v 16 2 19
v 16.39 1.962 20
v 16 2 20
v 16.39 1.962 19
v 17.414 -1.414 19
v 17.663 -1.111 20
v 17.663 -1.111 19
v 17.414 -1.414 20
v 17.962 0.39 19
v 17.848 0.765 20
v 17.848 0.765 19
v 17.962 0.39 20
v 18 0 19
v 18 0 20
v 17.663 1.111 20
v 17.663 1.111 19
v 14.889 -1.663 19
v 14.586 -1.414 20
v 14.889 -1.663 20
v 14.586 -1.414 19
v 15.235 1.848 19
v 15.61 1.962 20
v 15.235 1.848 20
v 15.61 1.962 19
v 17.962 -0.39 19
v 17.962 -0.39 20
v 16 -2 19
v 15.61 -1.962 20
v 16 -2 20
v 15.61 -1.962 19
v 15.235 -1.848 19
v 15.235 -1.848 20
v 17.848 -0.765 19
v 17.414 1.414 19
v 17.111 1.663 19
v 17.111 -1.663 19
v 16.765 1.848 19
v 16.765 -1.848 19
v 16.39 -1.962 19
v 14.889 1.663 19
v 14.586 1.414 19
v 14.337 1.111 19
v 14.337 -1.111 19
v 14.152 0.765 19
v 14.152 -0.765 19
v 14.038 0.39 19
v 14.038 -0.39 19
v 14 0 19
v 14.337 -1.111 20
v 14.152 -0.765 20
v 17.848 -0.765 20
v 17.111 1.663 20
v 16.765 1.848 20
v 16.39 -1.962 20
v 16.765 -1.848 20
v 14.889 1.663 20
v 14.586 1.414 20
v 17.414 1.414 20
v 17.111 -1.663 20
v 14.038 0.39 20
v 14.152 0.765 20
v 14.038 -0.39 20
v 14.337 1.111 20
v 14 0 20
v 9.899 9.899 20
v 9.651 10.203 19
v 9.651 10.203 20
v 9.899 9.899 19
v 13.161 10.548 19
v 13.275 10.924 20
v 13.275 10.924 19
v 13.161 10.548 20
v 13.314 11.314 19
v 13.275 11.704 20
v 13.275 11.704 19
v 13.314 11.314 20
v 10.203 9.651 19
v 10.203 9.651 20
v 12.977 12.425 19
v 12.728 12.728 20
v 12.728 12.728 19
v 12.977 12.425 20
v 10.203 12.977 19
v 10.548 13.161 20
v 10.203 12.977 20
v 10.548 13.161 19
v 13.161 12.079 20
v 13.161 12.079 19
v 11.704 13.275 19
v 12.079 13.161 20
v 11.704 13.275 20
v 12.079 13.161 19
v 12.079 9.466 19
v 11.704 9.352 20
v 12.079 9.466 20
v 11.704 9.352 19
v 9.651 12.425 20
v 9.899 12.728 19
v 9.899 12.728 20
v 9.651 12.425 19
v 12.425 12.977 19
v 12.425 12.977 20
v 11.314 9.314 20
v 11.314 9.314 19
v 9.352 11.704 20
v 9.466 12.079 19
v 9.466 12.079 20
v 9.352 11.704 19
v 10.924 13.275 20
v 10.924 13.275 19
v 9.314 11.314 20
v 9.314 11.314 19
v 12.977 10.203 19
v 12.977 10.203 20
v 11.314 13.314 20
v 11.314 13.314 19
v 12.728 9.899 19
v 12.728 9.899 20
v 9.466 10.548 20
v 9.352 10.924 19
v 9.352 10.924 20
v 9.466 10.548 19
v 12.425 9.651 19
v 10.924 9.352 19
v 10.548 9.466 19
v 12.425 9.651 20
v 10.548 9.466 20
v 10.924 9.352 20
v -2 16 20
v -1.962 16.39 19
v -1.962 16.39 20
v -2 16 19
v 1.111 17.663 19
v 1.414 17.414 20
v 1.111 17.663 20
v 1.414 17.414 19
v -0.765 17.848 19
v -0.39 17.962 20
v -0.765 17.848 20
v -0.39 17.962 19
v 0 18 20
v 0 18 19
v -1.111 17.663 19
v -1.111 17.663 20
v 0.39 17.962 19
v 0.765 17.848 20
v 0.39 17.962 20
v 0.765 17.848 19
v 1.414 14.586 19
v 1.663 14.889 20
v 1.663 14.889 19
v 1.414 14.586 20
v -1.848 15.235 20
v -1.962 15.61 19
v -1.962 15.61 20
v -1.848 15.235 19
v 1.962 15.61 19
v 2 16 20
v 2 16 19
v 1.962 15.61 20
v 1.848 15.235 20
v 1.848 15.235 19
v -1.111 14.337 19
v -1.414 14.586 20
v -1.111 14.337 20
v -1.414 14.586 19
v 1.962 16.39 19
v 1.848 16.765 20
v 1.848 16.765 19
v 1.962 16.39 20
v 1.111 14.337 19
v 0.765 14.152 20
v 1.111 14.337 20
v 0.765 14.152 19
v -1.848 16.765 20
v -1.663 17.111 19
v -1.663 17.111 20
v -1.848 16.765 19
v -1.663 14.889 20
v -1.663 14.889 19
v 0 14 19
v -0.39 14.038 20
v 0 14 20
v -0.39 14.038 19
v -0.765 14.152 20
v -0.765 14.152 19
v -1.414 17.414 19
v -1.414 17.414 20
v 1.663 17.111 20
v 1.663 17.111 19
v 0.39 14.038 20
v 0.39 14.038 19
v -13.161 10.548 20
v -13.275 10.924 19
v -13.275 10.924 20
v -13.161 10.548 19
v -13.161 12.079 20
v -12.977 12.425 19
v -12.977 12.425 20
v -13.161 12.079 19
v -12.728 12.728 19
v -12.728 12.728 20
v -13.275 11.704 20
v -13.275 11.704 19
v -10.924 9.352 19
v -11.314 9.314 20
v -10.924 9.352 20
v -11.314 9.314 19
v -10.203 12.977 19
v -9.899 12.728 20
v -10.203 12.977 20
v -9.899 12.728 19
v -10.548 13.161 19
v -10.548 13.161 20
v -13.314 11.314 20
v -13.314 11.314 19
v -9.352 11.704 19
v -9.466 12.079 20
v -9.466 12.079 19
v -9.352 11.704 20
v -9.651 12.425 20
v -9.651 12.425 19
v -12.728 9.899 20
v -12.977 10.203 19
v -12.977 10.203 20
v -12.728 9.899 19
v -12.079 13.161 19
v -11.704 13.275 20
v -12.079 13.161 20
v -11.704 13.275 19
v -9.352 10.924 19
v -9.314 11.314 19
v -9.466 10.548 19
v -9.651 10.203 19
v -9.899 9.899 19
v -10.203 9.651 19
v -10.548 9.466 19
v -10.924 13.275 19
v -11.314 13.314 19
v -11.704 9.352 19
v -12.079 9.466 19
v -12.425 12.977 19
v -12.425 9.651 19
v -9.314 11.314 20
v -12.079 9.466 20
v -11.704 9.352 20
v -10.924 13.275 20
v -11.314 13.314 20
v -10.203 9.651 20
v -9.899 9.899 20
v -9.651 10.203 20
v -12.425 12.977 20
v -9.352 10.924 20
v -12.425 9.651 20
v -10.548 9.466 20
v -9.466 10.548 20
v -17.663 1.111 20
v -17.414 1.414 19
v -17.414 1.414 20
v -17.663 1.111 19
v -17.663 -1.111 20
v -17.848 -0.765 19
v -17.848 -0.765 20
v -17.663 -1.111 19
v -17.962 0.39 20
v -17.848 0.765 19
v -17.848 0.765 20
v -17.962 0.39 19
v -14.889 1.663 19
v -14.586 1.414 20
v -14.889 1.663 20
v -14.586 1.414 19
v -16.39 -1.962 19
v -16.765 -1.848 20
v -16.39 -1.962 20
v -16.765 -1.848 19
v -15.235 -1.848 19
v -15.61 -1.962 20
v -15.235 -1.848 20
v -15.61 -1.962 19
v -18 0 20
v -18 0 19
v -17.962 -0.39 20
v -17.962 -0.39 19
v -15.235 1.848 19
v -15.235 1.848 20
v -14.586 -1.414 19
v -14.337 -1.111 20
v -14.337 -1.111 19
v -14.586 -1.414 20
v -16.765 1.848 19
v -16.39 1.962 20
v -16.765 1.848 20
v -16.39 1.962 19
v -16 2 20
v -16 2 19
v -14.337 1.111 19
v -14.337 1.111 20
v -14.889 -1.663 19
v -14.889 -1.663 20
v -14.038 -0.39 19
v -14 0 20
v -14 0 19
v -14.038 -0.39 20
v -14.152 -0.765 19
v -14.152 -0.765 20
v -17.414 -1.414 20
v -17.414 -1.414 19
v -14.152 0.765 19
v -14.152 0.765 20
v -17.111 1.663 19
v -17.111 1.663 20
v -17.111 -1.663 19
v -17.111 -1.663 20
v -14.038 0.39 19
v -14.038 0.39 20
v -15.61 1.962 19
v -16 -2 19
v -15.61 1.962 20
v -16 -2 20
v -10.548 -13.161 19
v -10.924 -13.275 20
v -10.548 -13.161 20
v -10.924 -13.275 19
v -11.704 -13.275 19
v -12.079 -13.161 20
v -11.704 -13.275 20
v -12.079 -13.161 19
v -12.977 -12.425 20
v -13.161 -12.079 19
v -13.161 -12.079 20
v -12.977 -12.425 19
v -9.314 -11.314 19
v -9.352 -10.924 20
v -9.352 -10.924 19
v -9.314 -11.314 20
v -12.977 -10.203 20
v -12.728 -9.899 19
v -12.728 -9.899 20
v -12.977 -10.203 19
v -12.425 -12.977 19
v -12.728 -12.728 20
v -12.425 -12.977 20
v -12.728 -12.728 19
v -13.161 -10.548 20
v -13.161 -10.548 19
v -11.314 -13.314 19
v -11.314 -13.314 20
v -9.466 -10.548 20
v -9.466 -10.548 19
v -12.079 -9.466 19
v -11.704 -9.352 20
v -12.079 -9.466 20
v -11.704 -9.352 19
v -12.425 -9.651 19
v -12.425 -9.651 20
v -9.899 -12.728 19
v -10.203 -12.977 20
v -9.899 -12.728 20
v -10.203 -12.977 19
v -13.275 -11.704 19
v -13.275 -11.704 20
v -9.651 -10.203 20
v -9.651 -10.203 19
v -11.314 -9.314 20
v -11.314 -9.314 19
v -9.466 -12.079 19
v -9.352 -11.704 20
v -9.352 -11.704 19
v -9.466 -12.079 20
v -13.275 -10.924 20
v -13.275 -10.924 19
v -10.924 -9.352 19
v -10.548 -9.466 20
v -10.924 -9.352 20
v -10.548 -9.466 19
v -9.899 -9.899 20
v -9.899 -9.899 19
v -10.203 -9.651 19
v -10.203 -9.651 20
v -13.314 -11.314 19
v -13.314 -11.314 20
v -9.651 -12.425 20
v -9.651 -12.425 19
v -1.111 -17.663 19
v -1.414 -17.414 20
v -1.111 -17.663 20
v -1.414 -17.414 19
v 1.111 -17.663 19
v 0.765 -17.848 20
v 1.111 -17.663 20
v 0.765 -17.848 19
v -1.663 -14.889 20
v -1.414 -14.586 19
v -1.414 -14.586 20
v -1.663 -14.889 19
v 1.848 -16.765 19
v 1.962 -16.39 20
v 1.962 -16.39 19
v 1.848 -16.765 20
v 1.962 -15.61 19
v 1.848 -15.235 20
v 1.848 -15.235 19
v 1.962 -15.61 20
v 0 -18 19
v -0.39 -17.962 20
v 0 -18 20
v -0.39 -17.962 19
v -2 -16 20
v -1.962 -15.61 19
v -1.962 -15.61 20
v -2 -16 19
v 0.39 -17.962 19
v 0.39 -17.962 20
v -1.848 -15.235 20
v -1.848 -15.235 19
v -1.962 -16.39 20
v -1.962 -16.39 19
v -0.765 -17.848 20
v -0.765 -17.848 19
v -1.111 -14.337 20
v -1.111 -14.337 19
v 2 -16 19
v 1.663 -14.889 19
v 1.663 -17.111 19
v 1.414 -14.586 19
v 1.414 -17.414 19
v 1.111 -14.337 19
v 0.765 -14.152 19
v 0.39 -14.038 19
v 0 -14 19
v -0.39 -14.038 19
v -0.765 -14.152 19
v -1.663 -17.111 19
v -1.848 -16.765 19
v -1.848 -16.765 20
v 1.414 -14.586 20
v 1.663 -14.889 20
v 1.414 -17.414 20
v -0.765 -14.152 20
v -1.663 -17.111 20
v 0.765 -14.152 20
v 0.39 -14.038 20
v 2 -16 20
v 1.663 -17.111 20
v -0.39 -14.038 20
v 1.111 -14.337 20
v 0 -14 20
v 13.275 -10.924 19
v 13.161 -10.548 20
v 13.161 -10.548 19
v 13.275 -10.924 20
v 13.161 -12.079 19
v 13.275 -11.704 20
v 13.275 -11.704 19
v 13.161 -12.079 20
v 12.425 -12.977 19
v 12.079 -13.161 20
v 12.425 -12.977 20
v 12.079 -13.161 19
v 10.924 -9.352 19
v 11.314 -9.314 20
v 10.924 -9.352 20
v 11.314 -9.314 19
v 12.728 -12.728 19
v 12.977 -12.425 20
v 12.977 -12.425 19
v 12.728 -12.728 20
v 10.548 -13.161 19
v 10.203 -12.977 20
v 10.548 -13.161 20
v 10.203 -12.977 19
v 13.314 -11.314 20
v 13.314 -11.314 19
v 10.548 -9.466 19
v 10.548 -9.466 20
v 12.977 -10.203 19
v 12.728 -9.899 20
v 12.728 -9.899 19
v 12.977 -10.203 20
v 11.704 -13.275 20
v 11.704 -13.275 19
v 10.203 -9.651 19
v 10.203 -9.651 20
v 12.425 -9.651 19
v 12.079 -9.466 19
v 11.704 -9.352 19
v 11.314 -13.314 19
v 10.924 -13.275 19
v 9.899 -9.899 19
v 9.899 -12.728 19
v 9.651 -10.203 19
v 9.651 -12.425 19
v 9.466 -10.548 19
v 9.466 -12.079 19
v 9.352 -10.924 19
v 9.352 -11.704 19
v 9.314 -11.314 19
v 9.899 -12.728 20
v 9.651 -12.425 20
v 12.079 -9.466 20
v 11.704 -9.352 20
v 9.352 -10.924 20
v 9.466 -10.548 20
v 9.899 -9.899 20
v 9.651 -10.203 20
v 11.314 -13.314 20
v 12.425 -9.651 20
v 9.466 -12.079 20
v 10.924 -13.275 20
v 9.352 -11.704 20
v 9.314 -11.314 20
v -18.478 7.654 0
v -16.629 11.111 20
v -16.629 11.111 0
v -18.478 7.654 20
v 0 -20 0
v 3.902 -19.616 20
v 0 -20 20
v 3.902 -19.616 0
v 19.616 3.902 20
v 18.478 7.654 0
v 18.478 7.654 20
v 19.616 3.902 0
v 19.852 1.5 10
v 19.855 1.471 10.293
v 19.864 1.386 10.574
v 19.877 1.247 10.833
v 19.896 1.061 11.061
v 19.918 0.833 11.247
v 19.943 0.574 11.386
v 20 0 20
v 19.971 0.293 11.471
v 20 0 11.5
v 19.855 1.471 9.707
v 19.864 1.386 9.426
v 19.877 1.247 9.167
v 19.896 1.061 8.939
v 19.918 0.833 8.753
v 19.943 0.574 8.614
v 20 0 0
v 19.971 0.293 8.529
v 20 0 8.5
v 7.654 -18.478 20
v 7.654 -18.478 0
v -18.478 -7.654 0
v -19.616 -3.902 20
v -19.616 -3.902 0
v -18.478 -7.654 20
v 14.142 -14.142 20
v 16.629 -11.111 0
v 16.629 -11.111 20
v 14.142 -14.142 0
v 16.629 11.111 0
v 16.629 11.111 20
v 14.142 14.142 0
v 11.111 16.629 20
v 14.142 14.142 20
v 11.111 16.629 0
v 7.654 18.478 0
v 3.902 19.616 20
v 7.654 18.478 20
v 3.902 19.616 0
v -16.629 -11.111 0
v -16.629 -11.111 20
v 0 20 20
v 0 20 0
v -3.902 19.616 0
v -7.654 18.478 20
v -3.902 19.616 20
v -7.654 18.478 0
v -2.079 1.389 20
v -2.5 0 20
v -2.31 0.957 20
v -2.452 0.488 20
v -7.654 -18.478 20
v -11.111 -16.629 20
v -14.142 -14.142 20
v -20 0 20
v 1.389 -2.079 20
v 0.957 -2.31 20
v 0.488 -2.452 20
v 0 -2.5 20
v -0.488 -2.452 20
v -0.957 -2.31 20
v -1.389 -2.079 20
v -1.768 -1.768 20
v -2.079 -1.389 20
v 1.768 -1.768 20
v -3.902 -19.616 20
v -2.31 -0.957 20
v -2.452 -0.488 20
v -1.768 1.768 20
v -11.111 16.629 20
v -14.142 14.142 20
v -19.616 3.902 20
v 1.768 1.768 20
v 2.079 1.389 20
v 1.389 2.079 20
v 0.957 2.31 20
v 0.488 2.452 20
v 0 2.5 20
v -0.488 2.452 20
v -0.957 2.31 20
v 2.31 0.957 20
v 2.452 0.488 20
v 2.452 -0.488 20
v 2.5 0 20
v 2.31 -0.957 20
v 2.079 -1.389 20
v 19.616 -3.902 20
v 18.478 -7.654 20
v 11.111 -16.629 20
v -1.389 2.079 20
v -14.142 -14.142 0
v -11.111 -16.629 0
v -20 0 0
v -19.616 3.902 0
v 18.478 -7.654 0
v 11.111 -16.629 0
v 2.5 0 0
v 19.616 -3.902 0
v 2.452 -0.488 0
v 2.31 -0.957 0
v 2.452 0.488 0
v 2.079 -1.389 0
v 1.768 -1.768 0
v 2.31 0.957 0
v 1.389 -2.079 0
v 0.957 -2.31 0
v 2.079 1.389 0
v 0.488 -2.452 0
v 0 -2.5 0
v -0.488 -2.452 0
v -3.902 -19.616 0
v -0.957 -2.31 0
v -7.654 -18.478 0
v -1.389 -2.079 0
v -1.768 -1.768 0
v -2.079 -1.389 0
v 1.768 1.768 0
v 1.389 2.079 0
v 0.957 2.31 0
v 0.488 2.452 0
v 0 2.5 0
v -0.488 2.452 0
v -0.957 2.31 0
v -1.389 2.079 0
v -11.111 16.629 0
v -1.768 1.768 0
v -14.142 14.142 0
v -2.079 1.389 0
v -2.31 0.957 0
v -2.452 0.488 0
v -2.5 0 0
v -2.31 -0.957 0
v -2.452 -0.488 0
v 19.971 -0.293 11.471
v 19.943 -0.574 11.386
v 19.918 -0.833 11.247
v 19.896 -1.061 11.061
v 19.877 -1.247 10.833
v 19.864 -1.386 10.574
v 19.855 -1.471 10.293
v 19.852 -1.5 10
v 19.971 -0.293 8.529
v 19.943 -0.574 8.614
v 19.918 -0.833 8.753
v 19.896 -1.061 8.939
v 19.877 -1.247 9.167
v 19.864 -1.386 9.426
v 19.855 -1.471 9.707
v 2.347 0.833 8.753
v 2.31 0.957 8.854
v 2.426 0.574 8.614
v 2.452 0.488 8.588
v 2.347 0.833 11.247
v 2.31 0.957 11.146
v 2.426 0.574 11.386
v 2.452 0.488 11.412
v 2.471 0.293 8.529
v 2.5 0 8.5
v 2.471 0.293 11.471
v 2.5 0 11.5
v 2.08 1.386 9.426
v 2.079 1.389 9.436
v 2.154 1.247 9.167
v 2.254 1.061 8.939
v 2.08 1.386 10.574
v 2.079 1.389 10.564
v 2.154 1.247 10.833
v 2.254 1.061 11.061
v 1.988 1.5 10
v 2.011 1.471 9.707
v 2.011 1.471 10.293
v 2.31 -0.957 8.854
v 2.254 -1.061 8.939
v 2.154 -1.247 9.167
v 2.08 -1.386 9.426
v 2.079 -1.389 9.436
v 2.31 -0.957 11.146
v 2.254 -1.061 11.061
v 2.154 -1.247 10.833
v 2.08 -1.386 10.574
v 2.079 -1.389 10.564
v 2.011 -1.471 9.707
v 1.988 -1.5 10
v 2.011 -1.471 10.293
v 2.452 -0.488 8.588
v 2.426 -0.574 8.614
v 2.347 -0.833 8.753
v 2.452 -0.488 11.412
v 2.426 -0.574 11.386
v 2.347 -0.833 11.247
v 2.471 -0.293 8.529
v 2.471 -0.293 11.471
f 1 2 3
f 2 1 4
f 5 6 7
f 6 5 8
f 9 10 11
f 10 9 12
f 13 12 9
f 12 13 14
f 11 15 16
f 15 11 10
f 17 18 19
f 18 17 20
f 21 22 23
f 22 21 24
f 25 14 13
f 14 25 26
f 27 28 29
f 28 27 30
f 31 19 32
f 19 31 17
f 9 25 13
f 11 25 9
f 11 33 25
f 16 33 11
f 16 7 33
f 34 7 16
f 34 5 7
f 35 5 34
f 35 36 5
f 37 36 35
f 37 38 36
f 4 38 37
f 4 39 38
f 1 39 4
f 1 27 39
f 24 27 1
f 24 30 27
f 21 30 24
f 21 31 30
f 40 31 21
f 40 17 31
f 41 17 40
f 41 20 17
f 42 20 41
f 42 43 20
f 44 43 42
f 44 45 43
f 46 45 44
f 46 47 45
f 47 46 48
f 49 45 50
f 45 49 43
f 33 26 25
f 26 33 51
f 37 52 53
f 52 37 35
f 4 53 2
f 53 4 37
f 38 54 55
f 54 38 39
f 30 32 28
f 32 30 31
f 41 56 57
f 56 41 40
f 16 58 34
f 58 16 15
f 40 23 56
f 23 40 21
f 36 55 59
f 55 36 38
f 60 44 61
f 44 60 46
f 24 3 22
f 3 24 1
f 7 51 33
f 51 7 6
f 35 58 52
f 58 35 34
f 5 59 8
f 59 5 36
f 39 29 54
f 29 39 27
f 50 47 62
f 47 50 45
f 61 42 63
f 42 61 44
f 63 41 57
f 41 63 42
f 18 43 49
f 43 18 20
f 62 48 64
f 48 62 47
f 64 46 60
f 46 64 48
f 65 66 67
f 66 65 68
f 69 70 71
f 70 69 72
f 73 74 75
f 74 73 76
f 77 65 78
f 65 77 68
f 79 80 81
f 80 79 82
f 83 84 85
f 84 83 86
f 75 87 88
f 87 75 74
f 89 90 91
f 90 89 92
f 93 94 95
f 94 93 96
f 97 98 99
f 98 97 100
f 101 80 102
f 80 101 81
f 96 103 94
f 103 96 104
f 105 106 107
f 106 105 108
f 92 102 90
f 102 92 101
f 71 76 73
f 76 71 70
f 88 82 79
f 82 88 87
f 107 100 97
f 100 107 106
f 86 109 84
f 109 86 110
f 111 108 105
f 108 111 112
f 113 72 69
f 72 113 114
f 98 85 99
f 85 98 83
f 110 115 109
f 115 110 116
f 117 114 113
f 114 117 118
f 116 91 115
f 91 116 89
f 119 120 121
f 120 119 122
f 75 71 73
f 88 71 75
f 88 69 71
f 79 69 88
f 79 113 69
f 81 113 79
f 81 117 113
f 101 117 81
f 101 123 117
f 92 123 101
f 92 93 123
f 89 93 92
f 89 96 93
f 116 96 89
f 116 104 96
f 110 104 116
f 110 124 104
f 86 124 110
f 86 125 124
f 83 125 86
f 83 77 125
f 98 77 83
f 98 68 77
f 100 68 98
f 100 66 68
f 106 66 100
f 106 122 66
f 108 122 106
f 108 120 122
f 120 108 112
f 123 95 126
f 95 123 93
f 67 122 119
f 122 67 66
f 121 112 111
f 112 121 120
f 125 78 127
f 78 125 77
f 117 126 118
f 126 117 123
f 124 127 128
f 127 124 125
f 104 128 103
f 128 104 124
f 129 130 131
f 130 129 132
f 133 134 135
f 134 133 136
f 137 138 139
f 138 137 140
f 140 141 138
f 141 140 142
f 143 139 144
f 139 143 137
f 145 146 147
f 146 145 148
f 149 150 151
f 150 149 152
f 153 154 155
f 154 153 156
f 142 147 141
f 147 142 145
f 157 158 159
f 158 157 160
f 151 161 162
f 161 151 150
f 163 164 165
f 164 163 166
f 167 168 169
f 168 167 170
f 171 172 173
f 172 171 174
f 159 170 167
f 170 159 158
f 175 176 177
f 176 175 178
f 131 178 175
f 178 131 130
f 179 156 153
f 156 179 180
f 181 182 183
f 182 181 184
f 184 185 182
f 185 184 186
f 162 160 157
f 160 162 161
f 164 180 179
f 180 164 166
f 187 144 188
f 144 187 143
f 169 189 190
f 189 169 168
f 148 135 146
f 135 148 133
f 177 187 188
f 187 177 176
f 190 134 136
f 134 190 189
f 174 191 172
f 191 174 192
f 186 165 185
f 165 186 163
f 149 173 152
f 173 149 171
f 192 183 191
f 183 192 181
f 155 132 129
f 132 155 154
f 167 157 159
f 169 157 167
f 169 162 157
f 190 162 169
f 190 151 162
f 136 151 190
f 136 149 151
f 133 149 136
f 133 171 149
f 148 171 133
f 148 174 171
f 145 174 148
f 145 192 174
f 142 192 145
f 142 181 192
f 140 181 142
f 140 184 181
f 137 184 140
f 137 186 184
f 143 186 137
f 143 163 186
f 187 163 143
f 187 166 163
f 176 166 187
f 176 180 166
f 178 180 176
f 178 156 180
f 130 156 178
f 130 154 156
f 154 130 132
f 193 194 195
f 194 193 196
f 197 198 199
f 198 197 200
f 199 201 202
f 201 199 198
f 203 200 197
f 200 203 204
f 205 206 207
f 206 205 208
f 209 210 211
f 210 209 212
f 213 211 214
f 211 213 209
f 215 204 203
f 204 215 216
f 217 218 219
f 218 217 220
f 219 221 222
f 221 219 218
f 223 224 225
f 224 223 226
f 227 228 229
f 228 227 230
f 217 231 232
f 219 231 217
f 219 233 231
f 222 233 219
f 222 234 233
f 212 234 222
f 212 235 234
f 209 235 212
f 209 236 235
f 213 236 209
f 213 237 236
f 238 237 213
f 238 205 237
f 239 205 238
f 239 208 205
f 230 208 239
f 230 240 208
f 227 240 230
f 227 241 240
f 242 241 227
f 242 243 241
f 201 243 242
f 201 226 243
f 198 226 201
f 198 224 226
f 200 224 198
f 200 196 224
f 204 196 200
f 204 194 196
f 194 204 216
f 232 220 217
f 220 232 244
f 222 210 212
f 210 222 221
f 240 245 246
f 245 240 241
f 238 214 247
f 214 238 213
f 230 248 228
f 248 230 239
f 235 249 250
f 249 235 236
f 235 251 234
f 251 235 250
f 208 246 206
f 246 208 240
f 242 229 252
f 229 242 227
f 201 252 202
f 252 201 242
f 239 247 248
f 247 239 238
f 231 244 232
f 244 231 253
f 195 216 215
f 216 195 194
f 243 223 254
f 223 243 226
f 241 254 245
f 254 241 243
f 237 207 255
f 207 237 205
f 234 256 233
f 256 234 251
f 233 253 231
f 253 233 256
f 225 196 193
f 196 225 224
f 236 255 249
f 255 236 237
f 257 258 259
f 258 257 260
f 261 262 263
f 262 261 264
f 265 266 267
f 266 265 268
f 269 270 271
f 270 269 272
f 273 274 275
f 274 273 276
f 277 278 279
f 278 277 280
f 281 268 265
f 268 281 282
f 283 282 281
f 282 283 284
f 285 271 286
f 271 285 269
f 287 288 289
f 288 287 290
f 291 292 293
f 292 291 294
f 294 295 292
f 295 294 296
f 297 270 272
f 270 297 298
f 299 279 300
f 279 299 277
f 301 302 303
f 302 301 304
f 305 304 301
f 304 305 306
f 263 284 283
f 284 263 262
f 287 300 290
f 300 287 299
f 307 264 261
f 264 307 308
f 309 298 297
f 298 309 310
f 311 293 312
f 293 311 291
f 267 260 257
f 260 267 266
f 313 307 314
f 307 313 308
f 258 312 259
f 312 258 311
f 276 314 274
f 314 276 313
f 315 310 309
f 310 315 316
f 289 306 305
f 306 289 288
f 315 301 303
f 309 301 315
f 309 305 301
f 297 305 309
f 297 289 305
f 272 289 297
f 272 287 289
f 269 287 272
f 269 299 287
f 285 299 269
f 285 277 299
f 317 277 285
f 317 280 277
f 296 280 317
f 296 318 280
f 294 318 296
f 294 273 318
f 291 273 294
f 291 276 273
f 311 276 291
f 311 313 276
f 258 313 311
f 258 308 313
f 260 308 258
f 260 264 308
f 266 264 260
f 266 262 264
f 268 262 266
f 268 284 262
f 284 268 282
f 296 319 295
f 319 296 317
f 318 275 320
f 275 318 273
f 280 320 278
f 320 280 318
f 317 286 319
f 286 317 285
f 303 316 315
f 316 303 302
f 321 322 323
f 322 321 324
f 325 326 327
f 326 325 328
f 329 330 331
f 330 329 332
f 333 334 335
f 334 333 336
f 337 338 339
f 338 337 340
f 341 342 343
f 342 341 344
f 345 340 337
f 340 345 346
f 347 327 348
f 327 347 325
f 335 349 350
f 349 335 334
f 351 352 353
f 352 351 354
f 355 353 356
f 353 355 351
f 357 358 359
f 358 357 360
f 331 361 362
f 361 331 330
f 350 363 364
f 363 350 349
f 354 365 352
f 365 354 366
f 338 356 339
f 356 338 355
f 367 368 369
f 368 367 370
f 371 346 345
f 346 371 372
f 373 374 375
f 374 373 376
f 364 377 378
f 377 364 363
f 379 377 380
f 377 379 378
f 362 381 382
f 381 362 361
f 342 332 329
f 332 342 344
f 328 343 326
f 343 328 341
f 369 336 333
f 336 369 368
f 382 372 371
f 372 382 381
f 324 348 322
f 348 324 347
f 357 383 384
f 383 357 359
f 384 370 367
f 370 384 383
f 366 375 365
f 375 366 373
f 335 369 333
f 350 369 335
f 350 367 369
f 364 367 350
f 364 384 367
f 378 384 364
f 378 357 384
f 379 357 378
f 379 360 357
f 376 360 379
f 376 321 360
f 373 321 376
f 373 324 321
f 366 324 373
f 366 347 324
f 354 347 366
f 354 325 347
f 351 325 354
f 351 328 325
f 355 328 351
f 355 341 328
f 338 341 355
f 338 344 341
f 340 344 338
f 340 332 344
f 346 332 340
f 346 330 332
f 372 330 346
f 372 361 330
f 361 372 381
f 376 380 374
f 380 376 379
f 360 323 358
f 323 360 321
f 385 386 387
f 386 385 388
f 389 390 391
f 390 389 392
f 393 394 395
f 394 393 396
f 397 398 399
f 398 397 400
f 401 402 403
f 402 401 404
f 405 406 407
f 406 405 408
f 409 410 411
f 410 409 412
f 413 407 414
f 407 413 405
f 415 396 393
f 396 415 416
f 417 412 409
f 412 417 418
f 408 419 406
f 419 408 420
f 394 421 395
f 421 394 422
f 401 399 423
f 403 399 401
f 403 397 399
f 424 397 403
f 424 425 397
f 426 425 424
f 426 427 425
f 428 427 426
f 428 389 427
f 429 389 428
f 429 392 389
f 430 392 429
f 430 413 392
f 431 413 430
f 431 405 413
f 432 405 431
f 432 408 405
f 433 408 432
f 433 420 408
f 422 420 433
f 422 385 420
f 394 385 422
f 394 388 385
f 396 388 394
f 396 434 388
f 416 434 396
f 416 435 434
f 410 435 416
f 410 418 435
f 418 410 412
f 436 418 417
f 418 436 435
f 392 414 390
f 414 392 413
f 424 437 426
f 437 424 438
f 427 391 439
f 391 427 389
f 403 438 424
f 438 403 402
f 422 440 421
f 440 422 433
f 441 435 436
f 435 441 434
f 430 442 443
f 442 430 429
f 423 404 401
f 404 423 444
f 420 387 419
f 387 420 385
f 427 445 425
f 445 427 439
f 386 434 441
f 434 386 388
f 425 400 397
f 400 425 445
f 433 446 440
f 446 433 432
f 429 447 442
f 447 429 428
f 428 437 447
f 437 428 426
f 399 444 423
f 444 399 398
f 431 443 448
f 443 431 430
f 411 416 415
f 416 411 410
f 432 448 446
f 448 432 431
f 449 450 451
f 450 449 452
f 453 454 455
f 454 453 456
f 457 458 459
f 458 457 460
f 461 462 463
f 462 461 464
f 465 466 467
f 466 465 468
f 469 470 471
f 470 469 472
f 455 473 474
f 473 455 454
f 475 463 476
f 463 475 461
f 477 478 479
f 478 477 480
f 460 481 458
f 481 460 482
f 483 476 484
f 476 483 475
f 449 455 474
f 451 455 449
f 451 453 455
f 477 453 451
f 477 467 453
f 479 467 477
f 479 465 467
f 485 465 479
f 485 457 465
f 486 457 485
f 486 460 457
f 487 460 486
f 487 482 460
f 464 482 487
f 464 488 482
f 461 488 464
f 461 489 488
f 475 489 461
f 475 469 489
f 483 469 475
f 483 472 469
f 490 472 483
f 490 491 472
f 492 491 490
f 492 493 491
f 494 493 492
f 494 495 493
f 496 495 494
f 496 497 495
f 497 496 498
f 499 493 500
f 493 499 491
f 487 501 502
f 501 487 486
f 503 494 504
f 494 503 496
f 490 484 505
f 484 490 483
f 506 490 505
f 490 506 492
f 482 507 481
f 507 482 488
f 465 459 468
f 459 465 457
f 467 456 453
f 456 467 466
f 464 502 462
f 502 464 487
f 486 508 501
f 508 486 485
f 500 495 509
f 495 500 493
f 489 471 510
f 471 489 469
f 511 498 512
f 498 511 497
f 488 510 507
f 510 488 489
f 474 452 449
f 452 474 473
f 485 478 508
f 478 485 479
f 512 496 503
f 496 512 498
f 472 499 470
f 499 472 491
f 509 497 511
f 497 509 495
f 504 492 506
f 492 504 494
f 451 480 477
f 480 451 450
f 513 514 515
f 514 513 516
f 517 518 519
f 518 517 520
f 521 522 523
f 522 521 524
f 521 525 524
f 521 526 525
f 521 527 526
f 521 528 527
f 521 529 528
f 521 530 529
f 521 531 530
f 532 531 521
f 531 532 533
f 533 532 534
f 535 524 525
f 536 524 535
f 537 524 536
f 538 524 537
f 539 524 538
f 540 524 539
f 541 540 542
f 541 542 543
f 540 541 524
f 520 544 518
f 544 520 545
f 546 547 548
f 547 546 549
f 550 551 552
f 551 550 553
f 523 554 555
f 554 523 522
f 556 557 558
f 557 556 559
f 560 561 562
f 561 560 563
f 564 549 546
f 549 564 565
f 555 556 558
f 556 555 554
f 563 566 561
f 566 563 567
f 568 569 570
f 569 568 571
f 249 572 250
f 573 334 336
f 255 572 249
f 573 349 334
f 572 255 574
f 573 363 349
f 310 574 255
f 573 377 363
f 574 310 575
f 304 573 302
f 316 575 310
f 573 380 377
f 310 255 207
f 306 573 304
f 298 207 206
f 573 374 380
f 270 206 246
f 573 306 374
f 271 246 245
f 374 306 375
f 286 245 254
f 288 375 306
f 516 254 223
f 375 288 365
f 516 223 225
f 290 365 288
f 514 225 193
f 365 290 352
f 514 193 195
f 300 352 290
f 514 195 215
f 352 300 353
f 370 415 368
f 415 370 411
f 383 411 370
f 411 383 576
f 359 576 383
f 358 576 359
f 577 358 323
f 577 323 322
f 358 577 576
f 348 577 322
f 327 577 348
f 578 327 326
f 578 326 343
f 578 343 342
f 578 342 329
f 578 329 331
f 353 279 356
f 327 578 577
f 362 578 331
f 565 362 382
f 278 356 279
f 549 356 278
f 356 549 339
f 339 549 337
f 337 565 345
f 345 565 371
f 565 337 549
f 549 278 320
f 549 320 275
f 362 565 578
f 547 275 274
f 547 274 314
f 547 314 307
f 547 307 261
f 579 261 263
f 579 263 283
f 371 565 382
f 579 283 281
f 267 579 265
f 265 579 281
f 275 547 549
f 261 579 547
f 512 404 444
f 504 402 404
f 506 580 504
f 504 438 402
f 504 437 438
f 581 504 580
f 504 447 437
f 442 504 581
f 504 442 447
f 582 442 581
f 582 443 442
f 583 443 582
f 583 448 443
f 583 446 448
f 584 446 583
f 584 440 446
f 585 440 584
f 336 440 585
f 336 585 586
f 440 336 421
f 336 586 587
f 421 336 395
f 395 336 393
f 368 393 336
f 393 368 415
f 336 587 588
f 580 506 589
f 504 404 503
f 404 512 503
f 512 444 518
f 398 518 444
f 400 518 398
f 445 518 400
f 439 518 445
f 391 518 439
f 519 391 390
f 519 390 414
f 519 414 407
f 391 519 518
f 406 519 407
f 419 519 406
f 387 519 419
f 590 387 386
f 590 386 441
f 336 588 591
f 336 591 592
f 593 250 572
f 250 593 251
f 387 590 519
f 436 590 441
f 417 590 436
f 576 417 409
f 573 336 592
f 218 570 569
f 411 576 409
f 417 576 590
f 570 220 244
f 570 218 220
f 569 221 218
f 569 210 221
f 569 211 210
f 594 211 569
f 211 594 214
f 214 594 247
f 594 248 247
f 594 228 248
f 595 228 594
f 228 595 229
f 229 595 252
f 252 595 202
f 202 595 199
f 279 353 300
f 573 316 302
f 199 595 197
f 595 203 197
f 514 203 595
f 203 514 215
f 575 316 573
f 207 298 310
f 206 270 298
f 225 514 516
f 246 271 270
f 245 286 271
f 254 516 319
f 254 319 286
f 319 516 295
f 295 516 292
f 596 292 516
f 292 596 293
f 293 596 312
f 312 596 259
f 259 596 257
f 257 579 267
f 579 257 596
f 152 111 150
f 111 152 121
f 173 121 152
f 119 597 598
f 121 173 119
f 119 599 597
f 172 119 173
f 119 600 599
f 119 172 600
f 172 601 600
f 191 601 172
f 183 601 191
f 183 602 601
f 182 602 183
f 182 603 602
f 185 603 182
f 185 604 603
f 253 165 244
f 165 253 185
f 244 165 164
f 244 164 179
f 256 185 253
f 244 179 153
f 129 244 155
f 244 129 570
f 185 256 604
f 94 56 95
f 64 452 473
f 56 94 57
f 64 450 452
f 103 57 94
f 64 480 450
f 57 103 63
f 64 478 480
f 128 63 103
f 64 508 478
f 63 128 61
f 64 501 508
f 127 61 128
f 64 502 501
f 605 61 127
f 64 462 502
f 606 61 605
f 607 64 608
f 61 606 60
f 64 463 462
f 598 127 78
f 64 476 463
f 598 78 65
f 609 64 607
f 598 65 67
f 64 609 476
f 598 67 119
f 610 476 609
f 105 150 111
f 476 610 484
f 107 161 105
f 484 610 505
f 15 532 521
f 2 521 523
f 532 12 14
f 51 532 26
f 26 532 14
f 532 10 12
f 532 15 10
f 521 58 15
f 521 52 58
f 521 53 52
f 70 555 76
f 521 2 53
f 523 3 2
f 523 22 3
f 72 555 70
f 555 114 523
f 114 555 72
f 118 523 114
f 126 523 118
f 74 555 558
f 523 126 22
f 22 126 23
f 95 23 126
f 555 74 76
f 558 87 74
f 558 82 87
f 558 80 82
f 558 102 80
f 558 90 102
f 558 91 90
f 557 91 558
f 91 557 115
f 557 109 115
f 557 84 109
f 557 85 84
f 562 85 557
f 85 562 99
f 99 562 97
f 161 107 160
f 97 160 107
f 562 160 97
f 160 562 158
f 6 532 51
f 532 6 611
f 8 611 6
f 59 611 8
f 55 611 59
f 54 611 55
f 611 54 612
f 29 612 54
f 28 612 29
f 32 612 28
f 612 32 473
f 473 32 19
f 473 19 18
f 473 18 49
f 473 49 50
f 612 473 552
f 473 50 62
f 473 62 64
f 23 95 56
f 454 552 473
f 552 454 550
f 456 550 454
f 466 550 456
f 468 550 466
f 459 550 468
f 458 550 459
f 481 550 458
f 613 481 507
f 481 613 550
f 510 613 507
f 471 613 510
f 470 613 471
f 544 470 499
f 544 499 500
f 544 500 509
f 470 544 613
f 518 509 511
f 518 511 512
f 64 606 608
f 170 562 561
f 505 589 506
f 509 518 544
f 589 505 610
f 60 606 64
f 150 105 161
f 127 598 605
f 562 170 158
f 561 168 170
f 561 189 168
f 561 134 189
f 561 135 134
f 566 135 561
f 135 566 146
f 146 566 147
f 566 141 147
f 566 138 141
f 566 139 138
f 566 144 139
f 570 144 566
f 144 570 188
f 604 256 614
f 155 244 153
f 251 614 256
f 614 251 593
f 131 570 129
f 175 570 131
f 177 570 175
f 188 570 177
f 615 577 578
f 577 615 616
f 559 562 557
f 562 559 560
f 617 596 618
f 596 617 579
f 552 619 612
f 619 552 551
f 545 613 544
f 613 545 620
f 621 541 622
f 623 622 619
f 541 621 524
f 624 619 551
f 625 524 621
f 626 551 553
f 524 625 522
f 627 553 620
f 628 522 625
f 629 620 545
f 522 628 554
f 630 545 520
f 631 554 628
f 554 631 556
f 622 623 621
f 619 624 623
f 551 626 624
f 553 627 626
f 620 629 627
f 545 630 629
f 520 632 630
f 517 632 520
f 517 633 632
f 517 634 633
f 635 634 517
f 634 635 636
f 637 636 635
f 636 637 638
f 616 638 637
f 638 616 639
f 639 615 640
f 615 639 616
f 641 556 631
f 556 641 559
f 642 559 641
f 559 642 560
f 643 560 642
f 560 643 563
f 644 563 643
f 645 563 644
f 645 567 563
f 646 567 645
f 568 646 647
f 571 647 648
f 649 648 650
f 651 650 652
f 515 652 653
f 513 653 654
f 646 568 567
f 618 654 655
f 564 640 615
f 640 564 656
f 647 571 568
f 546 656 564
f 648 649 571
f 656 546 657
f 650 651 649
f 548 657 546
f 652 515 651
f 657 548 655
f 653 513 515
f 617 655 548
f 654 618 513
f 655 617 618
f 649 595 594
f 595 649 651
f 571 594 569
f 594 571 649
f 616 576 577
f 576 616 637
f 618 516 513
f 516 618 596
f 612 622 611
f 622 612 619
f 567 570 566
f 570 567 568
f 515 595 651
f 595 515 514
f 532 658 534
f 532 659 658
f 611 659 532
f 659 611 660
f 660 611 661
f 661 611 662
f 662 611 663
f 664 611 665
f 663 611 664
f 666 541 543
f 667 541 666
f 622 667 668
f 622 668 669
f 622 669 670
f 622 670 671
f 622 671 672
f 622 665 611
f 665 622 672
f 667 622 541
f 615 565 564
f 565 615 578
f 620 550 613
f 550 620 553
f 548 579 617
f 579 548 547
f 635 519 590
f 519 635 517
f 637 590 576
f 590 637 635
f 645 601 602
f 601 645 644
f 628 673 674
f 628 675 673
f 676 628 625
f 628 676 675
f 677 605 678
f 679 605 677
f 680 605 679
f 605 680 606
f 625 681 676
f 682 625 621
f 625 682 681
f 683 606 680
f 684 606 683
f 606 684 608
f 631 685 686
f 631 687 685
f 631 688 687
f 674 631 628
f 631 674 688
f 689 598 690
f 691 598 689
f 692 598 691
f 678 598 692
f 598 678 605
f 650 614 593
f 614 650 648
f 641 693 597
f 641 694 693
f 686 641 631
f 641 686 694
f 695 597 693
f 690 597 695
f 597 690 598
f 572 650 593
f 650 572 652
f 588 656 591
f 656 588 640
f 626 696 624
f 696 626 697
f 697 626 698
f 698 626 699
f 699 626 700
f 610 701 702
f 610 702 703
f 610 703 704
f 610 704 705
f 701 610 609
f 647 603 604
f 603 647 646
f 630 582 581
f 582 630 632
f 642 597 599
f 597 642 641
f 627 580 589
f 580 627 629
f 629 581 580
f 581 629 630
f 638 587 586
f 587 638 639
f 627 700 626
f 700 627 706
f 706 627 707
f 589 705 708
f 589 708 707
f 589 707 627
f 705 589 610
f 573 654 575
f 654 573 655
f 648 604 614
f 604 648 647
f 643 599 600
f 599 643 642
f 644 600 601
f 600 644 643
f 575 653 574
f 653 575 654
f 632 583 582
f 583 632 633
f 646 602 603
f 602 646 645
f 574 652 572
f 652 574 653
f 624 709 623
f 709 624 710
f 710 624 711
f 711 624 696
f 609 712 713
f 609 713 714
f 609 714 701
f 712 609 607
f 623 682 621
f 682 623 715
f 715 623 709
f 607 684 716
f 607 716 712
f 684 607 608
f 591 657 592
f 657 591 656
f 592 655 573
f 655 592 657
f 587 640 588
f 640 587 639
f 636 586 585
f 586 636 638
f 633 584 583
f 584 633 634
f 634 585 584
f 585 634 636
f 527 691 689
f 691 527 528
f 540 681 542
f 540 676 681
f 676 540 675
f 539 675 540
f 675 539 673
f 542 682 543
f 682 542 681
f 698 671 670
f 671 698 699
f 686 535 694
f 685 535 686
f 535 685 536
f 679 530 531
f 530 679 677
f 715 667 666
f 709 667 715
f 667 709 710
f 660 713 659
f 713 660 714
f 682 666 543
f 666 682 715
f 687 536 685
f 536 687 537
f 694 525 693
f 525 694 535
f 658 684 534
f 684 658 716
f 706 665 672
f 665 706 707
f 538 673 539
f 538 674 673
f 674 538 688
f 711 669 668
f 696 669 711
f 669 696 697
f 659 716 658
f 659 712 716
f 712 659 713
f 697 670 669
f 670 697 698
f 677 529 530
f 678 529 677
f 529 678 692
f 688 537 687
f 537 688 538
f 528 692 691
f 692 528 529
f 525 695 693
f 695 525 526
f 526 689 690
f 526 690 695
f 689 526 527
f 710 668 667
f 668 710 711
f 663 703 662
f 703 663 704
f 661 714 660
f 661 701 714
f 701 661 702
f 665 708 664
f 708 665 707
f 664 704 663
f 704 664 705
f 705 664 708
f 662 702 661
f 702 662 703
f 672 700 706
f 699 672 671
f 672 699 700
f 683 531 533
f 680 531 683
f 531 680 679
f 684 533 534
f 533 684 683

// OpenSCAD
$fn = 32;

// ----------------------------------------------------------------------
// Control knob: dimpled knob
// ----------------------------------------------------------------------

// --- parameters (mm) ---
dimp_d = 4;               // finger dimple diameter
n_dimp = 8;               // number of dimples
dimp_r = 16;              // dimple ring radius
knob_d = 40;              // knob body diameter
knob_h = 20;              // knob body height
bore_d = 5;               // shaft bore diameter
set_d = 3;                // set screw bore diameter

dimp_step = 360 / n_dimp;  // dimple angular step

difference() {
  cylinder(h = knob_h, d = knob_d);
  translate([0, 0, -1]) cylinder(h = knob_h + 2, d = bore_d);
  translate([-1, 0, knob_h / 2]) rotate([0, 90, 0])
    cylinder(h = knob_d / 2 + bore_d / 2 + 2, d = set_d);  for (i = [0 : n_dimp - 1])
    rotate([0, 0, i * dimp_step])
      translate([dimp_r, 0, knob_h - 1])
        cylinder(h = 2, d = dimp_d);
}
